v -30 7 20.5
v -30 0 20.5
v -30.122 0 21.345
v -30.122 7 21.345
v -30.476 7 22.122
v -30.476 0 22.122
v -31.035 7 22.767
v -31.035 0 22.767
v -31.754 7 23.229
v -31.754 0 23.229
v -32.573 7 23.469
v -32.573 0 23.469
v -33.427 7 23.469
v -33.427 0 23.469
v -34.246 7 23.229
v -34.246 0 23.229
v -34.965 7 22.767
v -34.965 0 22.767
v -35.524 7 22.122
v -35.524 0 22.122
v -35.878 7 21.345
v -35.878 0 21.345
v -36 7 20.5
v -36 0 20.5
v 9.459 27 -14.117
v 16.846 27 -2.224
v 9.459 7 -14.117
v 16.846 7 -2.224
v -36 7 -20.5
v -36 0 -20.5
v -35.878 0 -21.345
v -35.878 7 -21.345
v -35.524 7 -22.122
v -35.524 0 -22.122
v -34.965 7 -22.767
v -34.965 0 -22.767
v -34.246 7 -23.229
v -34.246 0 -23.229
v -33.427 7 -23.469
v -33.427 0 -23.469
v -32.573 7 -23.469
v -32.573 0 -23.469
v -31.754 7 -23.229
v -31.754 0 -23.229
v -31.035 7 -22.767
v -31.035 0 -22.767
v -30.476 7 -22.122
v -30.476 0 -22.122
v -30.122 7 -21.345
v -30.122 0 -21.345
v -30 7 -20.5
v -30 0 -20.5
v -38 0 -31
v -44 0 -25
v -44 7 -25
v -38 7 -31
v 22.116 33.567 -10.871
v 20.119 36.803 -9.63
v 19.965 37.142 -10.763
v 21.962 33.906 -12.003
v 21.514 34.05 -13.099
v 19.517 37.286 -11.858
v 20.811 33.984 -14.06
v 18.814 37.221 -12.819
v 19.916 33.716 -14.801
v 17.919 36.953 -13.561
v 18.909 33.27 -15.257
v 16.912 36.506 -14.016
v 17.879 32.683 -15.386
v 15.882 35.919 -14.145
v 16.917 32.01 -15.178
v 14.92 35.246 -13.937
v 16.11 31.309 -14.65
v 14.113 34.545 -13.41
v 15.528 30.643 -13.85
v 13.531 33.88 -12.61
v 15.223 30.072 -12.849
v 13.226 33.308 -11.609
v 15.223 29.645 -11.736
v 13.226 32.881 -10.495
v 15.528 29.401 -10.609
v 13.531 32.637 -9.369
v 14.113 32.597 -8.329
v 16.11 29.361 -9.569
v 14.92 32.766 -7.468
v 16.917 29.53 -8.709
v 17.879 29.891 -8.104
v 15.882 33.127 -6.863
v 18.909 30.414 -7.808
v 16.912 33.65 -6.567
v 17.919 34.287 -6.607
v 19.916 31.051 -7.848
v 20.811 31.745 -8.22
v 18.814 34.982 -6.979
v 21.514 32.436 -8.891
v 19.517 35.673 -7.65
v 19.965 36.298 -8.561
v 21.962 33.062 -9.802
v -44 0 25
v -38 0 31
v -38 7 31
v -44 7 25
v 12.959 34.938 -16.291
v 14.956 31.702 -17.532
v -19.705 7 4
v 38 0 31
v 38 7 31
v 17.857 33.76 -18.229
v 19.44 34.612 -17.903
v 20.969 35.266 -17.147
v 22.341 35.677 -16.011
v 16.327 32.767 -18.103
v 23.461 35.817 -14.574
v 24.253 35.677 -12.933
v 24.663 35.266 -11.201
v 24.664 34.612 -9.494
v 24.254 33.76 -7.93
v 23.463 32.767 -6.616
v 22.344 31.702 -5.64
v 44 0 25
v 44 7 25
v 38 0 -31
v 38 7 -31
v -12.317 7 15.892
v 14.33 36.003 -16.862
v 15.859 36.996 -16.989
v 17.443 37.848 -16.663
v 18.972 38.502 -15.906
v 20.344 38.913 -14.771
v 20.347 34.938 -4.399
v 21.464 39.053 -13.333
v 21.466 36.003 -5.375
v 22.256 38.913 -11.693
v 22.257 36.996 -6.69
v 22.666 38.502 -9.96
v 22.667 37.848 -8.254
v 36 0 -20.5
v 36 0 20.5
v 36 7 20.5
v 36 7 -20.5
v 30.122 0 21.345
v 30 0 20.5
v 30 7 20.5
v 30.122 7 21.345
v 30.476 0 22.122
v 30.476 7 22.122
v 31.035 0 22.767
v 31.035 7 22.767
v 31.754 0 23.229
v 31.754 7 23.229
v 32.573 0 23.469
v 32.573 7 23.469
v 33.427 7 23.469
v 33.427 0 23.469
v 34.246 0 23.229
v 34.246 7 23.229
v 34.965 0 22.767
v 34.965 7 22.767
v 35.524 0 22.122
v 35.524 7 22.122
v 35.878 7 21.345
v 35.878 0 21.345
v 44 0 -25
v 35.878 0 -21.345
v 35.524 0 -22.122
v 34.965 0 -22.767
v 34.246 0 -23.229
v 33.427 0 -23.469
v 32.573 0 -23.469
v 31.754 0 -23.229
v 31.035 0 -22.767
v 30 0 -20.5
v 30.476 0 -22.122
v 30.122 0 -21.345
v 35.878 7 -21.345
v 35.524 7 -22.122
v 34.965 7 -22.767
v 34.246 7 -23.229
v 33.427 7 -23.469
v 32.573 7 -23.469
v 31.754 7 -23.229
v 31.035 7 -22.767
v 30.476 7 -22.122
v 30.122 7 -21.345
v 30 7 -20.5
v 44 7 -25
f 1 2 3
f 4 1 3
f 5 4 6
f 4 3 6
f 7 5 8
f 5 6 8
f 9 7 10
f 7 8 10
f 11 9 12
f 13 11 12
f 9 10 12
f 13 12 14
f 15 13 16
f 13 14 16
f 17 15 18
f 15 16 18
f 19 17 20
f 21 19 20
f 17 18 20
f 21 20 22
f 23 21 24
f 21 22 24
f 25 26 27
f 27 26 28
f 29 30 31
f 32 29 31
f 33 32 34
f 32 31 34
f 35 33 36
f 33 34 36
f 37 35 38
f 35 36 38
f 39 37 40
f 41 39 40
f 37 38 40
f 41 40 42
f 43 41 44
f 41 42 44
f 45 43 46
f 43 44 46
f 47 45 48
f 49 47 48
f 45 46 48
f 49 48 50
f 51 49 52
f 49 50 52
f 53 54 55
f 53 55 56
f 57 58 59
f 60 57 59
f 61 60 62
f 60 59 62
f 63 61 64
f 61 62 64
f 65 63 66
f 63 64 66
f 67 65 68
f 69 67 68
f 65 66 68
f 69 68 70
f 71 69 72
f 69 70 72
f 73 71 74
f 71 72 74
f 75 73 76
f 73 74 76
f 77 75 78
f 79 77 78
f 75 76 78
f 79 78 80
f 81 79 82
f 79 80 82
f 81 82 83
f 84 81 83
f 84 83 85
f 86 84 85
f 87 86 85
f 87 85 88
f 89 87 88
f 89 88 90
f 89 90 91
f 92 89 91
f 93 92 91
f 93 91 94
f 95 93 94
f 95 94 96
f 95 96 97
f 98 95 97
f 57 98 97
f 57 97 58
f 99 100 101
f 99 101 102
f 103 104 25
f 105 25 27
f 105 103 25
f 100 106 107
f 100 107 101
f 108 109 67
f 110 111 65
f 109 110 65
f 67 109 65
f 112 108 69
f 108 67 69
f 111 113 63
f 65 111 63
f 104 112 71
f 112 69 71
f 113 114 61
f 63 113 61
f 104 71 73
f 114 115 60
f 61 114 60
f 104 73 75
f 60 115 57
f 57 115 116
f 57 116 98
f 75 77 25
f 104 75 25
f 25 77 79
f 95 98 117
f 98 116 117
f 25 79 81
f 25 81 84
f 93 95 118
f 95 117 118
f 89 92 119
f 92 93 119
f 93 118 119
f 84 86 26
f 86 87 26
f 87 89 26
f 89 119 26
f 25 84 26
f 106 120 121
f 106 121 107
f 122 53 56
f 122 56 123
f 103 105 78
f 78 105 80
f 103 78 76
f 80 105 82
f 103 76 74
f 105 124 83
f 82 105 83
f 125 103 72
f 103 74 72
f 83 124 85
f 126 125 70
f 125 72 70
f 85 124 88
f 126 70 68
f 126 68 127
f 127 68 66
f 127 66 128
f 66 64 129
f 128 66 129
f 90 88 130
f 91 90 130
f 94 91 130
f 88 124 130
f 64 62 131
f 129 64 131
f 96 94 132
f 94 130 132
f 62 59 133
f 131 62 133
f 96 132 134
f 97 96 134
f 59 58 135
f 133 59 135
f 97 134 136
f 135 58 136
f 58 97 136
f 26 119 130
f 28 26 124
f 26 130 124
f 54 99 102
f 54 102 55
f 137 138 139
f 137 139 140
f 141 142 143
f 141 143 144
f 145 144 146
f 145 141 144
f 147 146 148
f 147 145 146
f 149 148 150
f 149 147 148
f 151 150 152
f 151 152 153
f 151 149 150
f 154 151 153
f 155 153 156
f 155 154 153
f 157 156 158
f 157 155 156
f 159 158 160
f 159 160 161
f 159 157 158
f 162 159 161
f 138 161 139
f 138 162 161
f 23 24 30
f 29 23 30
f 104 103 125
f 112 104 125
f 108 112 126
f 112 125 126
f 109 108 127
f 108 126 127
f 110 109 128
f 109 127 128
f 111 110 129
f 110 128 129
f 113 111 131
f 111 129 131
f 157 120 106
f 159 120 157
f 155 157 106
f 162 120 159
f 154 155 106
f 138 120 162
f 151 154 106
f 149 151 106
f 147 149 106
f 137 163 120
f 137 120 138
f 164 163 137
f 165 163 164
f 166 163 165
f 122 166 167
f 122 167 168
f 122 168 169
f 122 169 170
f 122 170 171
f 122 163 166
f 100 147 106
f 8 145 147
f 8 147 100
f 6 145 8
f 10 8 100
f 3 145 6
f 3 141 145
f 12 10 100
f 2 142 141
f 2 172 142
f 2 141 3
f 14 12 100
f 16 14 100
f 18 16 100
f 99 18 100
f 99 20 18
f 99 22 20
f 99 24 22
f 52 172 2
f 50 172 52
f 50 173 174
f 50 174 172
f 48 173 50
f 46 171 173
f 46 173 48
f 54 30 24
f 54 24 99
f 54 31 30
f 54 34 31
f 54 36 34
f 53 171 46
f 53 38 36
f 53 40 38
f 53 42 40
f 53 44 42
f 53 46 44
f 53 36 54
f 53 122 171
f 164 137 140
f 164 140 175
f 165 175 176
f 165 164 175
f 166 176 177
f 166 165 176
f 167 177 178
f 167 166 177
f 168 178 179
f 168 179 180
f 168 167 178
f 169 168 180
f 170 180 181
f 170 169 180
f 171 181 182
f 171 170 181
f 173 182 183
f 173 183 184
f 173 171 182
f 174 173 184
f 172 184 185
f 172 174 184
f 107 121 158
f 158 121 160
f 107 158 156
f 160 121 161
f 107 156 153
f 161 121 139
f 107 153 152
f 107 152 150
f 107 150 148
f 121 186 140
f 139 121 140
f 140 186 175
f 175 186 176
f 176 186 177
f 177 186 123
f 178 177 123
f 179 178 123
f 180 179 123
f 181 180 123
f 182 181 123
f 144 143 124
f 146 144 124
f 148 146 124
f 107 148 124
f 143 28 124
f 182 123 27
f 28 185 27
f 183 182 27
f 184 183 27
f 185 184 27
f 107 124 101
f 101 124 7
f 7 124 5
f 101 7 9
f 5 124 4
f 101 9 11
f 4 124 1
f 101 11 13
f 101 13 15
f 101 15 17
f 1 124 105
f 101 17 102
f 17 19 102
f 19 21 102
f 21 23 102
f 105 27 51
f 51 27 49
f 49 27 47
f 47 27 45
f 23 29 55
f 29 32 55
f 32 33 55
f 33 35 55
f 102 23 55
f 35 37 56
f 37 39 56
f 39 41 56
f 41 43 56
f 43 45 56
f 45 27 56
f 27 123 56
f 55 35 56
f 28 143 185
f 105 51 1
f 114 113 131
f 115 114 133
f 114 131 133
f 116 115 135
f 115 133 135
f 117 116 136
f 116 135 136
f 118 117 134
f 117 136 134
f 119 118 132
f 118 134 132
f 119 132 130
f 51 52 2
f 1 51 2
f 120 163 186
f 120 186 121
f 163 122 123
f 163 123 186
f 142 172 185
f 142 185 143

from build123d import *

# Parameters (mm, degrees)
BOSS_EXTRUDE1_DEPTH     = 7
BOSS_EXTRUDE2_DEPTH     = 7
SKETCH4_R               = 4
CUT_EXTRUDE1_DEPTH      = 47.435908473
CUT_EXTRUDE1_DEPTH_BACK = 14


with BuildPart() as part:
    # Sketch1 → Boss-Extrude1 (new body)
    with BuildSketch(Plane(origin=(0, 0, 0), x_dir=(1, 0, 0), z_dir=(0, 1, 0))):
        Polygon((-44, 25), (-38, 31), (38, 31), (44, 25), (44, -25), (38, -31), (-38, -31), (-44, -25), align=None)
        with BuildLine():
            Line((-36, -20.5), (-36, 20.5))
            ThreePointArc((-36, 20.5), (-33, 23.5), (-30, 20.5))
            Line((-30, 20.5), (-30, -20.5))
            ThreePointArc((-30, -20.5), (-33, -23.5), (-36, -20.5))
        make_face(mode=Mode.SUBTRACT)
        with BuildLine():
            Line((36, -20.5), (36, 20.5))
            ThreePointArc((36, 20.5), (33, 23.5), (30, 20.5))
            Line((30, 20.5), (30, -20.5))
            ThreePointArc((30, -20.5), (33, -23.5), (36, -20.5))
        make_face(mode=Mode.SUBTRACT)
    extrude(amount=BOSS_EXTRUDE1_DEPTH)

    # Sketch3 → Boss-Extrude2 (add, symmetric)
    with BuildSketch(Plane(origin=(0, 0, 0), x_dir=(0.849441251, 0, -0.527683201), z_dir=(0.527683201, 0, 0.849441251))):
        Polygon((15.483777963, 7), (-18.849066913, 7), (25.26789187, 39.052846762), (27.619032879, 35.816778784), (15.483777963, 27), align=None)
    extrude(amount=BOSS_EXTRUDE2_DEPTH, both=True)

    # Sketch4 → Cut-Extrude1 (cut, two sides)
    with BuildSketch(Plane(origin=(-8.359258135, 13.544823437, 5.192872478), x_dir=(0.866435488, 0.466201263, 0.178734239), z_dir=(-0.49928904, 0.809016994, 0.310164404))) as cut_extrude1_sk:
        with Locations((28.868116916, 22.166684098)):
            Circle(SKETCH4_R)
        with BuildLine():
            ThreePointArc((24.604923104, 27.718726833), (29.779470735, 29.107104418), (34.420159658, 26.4298779))
            Line((34.420159658, 26.4298779), (30.156965838, 31.981920644))
            Line((30.156965838, 31.981920644), (24.604923104, 27.718726833))
        make_face()
        with BuildLine():
            ThreePointArc((34.420159658, 26.4298779), (35.808537235, 21.255330279), (33.131310727, 16.614641364))
            Line((33.131310727, 16.614641364), (38.683353462, 20.877835176))
            Line((38.683353462, 20.877835176), (34.420159658, 26.4298779))
        make_face()
    extrude(amount=CUT_EXTRUDE1_DEPTH, mode=Mode.SUBTRACT)
    extrude(cut_extrude1_sk.sketch, amount=-CUT_EXTRUDE1_DEPTH_BACK, mode=Mode.SUBTRACT)


solid = part.part
